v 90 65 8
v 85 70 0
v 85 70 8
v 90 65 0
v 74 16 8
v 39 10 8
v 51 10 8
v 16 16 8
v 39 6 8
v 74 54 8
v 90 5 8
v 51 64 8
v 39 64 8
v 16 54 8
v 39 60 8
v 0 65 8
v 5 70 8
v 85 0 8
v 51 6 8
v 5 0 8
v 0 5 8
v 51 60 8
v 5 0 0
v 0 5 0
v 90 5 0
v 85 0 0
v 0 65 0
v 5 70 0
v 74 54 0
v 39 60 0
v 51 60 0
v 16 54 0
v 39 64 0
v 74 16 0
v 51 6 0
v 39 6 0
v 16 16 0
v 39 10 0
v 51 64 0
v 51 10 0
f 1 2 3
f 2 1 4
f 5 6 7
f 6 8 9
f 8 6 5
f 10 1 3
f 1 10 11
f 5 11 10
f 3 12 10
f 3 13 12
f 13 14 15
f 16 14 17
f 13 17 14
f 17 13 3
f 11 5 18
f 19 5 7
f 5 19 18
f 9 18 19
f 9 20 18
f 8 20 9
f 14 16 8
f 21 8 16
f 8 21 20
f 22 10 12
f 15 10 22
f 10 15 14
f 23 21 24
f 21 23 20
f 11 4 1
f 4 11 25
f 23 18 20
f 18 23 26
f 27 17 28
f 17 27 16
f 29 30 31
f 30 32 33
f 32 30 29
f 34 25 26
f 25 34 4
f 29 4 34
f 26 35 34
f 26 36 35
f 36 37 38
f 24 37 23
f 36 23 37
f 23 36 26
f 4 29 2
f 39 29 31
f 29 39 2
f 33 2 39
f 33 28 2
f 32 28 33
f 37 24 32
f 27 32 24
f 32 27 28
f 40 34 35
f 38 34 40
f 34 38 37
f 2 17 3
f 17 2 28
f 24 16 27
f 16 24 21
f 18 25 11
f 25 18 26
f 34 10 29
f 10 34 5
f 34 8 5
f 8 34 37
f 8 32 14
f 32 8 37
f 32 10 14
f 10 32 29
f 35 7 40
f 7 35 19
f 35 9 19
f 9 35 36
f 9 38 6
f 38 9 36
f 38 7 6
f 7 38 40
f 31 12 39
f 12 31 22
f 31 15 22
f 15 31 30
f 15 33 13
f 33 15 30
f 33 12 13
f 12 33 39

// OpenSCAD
$fn = 32;

// ----------------------------------------------------------------------
// Frame plate: 90 x 70 frame, 16 mm rails
// ----------------------------------------------------------------------

// --- parameters (mm) ---
plate_l = 90;             // plate length, X
plate_w = 70;             // plate width, Y
plate_t = 8;              // plate thickness, Z (extrusion height)
corner_c = 5;             // corner chamfer
frame_bar = 16;           // frame rail width
slot_l = 12;              // adjustment slot length
slot_w = 4;               // adjustment slot width

win_l = plate_l - 2 * frame_bar;  // window length
win_w = plate_w - 2 * frame_bar;  // window width

profile = [[5, 0], [85, 0], [90, 5], [90, 65], [85, 70], [5, 70], [0, 65], [0, 5]];  // primary outline, 8 points, counter clockwise
void_1 = [[16, 16], [74, 16], [74, 54], [16, 54]];  // the window, 4 points
void_2 = [[39, 6], [51, 6], [51, 10], [39, 10]];  // adjustment slot, 4 points
void_3 = [[39, 60], [51, 60], [51, 64], [39, 64]];  // adjustment slot, 4 points

// --- the one profile operation ---
difference() {
  linear_extrude(height = plate_t) polygon(points = profile);
  translate([0, 0, -1])
    linear_extrude(height = plate_t + 2) polygon(points = void_1);
  translate([0, 0, -1])
    linear_extrude(height = plate_t + 2) polygon(points = void_2);
  translate([0, 0, -1])
    linear_extrude(height = plate_t + 2) polygon(points = void_3);
}
